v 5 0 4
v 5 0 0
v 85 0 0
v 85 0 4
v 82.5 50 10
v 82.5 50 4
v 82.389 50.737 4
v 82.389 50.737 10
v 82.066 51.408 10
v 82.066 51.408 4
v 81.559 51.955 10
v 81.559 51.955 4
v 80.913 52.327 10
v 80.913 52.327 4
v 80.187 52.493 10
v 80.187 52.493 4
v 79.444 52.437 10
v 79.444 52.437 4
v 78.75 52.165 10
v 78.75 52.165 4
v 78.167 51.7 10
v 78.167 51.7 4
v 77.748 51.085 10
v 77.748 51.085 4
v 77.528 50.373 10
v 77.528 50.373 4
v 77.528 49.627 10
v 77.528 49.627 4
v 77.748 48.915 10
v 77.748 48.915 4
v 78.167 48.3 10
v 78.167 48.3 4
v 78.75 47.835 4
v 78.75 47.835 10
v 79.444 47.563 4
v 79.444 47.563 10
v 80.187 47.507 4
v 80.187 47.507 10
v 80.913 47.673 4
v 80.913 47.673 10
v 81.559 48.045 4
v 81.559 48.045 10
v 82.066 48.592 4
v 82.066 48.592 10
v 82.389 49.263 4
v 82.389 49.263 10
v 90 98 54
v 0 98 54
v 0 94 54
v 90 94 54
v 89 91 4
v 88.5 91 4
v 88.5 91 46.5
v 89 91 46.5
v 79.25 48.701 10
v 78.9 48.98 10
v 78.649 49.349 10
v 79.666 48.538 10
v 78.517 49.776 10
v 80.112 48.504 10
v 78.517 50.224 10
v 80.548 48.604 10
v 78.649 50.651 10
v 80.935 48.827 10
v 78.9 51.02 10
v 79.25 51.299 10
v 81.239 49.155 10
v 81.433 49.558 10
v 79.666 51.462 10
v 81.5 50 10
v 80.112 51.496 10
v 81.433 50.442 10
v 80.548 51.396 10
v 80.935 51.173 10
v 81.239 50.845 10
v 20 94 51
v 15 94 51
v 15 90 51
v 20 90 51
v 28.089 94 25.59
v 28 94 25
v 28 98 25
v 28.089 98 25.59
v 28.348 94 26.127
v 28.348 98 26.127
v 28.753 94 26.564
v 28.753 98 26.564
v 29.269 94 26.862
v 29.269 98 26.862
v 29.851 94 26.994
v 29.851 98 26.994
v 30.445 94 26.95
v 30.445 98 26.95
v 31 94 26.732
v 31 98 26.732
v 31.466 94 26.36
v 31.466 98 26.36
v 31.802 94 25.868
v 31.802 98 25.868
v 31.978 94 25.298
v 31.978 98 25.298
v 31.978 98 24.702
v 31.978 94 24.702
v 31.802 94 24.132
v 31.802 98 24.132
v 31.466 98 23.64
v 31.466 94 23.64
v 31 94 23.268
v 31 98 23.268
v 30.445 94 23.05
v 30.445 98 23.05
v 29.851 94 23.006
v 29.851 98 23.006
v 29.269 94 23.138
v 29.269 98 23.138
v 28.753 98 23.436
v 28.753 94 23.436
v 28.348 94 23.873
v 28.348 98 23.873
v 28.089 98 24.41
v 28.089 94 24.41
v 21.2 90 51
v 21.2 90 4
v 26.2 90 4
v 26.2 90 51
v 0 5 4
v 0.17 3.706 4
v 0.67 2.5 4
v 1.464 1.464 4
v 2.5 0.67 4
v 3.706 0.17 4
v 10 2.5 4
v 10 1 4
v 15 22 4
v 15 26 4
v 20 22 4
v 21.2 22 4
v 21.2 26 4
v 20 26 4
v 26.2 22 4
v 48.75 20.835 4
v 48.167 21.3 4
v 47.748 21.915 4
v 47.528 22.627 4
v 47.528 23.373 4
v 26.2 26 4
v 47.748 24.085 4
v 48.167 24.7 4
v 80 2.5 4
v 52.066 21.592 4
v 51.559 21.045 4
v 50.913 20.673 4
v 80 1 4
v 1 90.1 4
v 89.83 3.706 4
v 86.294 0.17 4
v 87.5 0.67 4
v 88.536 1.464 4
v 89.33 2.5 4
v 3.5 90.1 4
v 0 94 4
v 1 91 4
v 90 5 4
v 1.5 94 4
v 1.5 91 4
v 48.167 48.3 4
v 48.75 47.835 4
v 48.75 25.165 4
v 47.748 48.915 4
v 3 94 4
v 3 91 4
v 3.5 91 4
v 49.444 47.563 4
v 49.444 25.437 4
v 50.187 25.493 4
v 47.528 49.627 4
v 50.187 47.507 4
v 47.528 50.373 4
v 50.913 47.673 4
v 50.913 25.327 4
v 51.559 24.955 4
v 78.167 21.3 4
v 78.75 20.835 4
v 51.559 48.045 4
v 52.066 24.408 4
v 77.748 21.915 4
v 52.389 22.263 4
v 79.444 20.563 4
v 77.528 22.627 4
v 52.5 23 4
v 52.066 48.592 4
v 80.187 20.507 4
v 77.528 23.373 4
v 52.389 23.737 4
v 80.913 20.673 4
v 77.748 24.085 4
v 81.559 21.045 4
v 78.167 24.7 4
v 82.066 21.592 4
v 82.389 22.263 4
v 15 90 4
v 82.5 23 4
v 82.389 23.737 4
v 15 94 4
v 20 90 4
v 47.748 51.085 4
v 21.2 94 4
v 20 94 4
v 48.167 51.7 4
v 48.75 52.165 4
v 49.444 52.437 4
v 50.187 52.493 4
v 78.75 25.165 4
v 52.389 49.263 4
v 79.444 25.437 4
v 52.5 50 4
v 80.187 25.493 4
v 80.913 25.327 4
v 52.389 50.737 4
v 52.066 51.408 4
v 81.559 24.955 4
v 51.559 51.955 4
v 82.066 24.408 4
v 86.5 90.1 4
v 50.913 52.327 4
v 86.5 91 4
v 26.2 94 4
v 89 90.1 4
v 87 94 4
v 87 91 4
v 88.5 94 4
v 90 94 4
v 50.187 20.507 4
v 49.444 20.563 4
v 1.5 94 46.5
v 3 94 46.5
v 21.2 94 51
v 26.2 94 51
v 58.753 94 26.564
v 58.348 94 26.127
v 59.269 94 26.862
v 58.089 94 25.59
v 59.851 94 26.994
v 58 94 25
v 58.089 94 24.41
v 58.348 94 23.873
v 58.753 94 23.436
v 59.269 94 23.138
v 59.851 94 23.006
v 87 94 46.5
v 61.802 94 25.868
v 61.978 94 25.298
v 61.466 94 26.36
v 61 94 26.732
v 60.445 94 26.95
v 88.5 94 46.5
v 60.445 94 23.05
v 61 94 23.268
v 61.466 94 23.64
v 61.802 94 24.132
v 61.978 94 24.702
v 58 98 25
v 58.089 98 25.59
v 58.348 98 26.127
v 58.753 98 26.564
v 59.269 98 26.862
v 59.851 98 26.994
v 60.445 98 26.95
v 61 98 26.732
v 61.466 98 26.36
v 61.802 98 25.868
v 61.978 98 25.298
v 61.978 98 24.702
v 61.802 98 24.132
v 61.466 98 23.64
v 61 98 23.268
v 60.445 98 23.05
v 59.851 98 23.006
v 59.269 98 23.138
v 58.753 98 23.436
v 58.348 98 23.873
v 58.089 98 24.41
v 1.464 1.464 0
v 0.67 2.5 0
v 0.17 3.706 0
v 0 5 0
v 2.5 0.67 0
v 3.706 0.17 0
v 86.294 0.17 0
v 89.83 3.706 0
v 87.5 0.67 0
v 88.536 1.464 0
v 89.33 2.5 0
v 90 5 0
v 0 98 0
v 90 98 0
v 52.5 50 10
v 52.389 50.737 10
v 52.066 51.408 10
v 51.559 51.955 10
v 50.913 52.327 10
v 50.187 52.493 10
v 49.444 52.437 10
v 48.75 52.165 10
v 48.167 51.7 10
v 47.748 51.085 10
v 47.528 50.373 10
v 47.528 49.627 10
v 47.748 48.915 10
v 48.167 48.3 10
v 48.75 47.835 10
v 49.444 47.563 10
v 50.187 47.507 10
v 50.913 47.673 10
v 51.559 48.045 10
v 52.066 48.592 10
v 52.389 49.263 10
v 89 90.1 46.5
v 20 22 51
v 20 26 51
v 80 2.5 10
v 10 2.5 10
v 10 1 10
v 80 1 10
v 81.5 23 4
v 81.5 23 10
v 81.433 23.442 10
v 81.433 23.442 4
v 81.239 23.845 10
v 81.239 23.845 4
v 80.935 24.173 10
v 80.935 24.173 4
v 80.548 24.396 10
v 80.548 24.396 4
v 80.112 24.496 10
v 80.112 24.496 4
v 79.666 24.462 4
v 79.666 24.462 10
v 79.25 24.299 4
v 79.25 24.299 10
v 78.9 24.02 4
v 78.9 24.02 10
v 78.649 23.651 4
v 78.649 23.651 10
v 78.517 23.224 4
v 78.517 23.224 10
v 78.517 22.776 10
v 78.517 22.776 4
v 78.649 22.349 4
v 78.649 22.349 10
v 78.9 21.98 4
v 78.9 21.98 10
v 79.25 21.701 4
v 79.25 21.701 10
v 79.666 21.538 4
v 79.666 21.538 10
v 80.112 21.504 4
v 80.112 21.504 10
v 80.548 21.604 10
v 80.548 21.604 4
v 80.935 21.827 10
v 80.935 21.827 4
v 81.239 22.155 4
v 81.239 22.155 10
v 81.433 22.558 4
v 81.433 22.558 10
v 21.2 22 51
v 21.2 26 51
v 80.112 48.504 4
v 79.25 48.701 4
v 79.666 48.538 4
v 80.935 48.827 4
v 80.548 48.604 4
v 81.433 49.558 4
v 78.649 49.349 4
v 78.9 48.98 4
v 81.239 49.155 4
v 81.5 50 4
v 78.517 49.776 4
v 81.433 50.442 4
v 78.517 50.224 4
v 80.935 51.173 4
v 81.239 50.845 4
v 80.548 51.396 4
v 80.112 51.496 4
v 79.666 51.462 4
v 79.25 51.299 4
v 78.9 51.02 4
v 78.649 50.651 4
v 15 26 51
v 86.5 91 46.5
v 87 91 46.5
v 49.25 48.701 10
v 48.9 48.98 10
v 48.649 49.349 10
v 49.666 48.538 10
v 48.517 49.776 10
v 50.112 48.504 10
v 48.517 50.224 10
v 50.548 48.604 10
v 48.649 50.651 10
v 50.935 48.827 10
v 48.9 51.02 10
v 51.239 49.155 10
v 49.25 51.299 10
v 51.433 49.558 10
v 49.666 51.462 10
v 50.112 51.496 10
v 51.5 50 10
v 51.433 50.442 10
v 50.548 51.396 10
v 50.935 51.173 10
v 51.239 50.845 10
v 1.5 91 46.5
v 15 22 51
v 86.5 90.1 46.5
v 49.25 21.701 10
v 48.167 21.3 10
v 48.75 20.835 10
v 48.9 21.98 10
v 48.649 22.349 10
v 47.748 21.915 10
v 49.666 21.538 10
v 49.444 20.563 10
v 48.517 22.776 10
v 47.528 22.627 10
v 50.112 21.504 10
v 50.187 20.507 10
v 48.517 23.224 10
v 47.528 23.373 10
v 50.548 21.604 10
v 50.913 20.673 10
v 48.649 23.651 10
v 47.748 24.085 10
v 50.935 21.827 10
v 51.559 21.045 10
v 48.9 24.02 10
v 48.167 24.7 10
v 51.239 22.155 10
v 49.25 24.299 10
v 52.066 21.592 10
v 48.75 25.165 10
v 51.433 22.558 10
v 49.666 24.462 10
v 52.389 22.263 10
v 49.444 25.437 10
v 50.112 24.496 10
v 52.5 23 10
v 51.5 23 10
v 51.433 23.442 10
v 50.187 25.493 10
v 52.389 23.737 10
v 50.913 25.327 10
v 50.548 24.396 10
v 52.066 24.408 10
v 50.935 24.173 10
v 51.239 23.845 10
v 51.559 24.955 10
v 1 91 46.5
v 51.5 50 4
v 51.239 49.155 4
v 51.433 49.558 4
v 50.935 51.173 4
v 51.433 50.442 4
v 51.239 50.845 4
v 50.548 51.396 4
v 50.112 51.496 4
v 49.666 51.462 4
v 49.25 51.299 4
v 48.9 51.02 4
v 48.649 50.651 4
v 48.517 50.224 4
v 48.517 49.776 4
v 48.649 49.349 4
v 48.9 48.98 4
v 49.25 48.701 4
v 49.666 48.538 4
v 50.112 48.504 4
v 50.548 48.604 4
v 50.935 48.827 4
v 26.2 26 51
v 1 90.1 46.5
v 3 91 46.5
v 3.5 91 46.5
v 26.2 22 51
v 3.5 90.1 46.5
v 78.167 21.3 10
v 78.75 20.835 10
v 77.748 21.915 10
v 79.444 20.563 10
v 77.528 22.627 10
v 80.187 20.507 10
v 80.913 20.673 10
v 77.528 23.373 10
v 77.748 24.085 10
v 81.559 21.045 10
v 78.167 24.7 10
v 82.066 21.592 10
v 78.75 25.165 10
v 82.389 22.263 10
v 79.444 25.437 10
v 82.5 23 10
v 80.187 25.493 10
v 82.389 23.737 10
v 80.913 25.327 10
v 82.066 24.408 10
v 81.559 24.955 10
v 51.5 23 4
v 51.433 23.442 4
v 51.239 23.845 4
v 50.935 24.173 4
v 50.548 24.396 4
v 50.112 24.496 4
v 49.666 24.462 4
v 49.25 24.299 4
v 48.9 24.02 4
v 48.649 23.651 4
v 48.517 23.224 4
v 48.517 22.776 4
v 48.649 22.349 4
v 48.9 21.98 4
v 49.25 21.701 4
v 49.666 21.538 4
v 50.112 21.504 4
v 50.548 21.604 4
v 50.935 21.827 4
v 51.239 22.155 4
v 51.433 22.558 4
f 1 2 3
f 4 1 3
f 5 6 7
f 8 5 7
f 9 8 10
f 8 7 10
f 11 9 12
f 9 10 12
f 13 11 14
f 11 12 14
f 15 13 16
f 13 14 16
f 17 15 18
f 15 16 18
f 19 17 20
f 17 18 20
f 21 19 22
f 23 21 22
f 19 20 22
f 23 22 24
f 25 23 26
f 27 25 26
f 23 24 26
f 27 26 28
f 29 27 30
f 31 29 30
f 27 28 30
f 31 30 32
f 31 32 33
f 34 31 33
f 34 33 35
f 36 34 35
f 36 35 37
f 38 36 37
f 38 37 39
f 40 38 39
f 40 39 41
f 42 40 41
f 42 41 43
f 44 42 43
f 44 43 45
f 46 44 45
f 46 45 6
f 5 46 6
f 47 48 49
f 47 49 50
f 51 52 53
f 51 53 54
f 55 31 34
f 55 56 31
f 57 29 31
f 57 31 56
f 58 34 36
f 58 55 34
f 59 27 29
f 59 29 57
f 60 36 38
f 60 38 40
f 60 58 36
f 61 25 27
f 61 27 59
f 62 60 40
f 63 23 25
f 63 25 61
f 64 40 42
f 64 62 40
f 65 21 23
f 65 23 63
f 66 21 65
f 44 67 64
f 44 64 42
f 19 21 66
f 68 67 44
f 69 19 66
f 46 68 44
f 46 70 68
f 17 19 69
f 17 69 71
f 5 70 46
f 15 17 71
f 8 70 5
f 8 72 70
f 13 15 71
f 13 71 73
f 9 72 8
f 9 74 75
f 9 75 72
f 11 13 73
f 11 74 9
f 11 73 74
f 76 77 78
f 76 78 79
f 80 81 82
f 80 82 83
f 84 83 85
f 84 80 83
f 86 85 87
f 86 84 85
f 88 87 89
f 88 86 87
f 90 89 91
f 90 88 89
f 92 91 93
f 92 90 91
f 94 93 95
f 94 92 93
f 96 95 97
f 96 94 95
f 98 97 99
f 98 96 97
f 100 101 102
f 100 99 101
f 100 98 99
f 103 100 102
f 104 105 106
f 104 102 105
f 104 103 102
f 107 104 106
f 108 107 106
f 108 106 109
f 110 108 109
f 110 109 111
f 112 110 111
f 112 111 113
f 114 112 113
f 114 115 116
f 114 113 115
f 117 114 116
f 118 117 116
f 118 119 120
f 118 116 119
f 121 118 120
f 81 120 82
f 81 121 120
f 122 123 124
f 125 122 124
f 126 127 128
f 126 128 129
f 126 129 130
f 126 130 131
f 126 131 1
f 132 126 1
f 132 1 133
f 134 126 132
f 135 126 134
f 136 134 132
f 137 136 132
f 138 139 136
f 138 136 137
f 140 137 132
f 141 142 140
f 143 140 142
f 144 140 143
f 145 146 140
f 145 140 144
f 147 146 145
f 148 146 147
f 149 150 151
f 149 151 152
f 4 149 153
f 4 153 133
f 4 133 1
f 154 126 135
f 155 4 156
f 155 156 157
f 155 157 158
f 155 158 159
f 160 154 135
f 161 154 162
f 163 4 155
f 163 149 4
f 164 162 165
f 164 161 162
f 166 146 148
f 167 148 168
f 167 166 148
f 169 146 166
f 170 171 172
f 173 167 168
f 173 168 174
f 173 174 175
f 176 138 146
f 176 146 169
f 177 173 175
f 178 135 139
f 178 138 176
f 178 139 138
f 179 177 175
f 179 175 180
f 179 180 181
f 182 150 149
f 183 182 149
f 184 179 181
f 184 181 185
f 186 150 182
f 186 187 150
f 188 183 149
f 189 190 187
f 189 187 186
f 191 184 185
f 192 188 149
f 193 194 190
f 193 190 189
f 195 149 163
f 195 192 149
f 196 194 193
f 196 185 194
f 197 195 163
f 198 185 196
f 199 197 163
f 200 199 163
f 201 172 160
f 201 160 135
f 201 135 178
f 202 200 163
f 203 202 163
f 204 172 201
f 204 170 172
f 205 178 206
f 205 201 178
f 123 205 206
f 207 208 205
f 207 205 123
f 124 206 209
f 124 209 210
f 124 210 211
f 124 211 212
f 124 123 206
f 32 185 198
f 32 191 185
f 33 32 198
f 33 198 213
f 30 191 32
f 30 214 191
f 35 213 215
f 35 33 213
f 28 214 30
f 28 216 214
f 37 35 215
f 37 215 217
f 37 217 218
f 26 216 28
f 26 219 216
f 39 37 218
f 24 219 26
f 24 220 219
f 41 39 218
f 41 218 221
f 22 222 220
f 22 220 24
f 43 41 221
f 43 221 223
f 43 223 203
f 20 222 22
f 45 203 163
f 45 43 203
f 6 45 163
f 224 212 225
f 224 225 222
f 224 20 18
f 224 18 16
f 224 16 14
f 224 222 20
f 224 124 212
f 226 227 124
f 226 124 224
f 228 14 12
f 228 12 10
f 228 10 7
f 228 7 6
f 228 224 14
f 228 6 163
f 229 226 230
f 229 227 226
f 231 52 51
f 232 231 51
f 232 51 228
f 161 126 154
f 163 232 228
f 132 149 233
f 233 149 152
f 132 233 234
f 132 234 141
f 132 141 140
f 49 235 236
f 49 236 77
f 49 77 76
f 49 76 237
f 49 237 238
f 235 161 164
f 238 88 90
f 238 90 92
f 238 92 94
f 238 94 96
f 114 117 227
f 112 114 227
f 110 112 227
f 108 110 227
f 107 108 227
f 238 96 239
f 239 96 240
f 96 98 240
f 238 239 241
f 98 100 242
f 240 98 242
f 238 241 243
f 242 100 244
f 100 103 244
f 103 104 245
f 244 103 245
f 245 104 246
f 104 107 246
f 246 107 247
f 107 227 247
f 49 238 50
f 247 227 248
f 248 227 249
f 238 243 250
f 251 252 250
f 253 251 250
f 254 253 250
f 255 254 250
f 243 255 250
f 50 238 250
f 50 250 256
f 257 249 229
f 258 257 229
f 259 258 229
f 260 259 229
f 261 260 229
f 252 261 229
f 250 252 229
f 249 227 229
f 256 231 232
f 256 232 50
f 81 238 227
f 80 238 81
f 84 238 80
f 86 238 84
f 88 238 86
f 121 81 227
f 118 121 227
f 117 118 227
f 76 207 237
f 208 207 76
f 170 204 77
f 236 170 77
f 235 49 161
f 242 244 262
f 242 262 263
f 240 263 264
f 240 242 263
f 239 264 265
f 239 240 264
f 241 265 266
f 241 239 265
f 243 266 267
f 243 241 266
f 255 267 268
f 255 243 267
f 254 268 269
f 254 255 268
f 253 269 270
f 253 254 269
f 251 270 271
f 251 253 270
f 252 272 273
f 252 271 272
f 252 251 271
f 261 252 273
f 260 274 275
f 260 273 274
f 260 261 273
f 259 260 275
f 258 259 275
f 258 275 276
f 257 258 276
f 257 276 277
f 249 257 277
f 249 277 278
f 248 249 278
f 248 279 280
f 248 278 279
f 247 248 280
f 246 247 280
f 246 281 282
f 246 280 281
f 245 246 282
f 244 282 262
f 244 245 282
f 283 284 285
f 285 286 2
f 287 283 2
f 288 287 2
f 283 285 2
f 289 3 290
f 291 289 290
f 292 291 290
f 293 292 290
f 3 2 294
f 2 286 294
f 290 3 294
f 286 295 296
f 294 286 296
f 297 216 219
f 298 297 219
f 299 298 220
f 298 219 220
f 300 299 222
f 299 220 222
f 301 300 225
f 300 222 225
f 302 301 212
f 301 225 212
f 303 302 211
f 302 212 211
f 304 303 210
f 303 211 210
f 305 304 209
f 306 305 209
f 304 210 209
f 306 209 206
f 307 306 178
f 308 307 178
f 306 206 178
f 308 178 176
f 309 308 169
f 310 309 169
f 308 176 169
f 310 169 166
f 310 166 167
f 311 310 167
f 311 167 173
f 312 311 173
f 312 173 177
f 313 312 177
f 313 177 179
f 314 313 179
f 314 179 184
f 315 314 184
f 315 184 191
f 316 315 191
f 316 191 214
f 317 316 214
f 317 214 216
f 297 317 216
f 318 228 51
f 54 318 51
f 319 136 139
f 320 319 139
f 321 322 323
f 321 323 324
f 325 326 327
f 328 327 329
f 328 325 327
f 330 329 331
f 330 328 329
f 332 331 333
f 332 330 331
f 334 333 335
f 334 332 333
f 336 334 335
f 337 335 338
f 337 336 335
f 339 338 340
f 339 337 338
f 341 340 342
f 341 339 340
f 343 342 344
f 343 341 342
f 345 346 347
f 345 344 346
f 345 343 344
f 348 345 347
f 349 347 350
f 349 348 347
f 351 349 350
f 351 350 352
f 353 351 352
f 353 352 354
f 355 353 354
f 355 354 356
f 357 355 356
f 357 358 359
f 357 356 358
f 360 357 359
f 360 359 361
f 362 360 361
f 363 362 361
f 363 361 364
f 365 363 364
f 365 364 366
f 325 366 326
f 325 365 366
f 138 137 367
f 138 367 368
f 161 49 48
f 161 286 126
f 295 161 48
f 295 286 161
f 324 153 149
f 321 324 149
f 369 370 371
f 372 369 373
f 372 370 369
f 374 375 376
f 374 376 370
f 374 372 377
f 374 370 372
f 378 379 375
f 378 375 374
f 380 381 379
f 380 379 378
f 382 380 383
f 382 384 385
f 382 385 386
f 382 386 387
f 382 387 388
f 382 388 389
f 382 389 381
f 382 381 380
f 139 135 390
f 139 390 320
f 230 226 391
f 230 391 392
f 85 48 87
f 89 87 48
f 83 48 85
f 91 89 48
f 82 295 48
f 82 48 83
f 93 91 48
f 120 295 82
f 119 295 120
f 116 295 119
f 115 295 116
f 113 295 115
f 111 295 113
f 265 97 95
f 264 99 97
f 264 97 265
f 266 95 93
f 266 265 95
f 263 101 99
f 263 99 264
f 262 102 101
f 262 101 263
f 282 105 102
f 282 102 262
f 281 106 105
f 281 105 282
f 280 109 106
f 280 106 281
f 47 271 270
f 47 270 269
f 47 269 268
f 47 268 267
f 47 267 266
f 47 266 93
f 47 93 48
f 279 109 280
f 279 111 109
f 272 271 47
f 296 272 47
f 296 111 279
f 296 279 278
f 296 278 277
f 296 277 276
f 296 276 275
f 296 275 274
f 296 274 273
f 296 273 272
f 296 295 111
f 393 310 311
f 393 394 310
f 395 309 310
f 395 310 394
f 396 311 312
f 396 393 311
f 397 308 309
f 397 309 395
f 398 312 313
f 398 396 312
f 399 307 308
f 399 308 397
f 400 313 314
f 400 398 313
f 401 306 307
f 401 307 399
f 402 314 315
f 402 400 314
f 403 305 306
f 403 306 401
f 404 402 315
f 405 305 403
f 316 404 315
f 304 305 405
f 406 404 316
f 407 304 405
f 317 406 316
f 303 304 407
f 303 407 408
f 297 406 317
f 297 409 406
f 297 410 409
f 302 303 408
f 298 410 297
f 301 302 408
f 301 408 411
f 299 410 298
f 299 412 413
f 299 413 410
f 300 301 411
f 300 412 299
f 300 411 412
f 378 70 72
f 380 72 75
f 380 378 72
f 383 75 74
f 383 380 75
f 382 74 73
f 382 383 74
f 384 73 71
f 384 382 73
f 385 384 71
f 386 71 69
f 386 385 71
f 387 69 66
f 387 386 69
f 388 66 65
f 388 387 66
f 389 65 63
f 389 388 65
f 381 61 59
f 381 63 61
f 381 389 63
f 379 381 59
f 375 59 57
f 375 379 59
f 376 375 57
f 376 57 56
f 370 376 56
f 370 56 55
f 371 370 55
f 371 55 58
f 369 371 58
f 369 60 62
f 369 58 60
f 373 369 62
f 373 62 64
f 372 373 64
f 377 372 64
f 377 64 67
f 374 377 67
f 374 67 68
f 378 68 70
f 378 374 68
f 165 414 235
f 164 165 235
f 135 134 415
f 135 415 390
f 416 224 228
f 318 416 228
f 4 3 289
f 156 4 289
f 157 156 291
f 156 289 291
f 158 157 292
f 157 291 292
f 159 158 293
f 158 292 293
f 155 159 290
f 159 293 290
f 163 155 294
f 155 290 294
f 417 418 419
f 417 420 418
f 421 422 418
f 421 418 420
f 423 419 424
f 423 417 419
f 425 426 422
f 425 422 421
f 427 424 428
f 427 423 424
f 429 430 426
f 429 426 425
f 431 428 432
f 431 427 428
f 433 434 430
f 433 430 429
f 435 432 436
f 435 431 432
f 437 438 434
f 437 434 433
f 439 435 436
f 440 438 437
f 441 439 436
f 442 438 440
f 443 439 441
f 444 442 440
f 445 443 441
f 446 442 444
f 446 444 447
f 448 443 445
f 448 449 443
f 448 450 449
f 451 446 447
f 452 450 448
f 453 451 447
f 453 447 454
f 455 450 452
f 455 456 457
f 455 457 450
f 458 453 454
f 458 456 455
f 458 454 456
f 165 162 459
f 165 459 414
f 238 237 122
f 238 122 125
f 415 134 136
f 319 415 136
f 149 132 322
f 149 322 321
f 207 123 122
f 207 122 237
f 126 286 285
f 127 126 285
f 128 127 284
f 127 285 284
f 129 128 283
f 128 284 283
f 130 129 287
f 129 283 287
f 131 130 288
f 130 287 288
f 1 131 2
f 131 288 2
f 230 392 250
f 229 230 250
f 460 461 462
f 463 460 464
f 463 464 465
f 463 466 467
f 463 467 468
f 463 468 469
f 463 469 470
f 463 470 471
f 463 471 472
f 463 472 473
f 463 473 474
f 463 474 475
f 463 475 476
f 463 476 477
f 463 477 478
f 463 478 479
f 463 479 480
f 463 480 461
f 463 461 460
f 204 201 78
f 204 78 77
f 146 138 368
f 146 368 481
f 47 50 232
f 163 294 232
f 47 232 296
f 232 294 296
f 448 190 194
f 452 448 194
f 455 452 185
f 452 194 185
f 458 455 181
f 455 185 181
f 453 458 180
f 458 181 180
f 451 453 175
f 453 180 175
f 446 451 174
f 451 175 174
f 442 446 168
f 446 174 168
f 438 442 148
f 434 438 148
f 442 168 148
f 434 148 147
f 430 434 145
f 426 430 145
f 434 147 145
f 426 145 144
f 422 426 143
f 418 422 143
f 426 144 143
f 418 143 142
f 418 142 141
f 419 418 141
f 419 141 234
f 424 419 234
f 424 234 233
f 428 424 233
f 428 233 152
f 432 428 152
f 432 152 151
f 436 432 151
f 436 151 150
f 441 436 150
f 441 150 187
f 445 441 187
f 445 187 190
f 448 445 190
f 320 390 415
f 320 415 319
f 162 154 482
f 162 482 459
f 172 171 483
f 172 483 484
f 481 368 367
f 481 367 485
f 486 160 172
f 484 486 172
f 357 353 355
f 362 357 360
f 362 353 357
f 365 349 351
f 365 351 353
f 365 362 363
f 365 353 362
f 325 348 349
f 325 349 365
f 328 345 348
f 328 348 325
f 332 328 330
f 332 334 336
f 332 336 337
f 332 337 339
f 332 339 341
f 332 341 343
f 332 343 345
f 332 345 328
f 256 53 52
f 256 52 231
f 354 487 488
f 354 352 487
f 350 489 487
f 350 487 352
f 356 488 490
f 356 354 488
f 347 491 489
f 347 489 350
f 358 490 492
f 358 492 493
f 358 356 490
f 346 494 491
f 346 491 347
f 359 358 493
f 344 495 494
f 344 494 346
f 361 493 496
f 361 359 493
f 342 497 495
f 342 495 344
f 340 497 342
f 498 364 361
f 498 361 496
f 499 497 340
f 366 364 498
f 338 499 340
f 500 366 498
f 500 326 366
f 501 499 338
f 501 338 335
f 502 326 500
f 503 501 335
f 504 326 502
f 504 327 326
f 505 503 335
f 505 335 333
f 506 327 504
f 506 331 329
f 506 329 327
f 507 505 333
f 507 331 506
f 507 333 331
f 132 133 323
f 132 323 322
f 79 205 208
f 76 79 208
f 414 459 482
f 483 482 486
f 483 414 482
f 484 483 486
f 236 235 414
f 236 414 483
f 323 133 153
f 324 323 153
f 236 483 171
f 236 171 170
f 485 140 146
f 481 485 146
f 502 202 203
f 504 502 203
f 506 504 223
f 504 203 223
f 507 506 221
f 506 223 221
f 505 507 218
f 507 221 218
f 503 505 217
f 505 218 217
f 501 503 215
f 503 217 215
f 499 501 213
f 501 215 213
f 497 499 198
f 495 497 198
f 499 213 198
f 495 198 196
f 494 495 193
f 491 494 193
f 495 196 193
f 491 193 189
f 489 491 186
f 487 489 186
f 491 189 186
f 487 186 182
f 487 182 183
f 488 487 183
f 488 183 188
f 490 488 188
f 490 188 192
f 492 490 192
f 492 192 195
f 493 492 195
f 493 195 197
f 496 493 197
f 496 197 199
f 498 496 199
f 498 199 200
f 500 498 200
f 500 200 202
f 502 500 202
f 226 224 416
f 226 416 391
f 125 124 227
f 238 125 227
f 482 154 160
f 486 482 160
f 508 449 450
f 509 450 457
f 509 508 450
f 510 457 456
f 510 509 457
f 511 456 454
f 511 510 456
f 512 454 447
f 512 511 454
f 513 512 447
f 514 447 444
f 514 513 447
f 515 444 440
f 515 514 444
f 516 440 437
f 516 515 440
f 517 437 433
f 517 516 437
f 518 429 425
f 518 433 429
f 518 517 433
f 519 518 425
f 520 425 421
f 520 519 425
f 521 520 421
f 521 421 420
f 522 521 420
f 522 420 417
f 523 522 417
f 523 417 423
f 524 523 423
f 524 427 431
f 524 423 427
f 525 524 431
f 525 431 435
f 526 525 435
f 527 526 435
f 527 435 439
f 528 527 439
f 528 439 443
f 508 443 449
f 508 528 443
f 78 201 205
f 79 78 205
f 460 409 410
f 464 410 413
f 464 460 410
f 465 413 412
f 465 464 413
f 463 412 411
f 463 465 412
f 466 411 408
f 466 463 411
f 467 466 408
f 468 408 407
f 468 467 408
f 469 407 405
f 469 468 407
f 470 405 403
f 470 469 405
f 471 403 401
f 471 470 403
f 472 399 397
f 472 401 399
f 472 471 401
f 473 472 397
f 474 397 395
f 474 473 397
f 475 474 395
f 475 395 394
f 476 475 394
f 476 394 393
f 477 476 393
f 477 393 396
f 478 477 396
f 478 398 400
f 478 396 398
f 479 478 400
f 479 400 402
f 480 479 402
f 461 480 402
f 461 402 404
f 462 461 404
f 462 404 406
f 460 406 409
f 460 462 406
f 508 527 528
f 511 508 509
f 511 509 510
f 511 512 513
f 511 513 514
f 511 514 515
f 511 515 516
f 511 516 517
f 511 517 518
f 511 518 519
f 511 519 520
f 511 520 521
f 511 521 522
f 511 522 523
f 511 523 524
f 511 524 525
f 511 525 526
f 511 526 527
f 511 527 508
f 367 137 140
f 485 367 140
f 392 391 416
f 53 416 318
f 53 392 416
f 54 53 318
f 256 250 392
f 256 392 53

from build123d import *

# Parameters (mm, degrees)
PAD_DEPTH         = 4
SKETCH003_W       = 90
SKETCH003_H       = 4
PAD001_DEPTH      = 54
SKETCH002_W       = 5
SKETCH002_H       = 4
PAD002_DEPTH      = 51
SKETCH006_R       = 2
POCKET_DEPTH      = 84.001
POCKET_DEPTH_BACK = 14.001
SKETCH005_W       = 70
SKETCH005_H       = 1.5
PAD003_DEPTH      = 10
SKETCH004_W       = 1.5
SKETCH004_H       = 3
SKETCH004_W_2     = 2.5
SKETCH004_H_2     = 0.9
PAD004_DEPTH      = 46.5
SKETCH_R          = 2.5
PAD005_DEPTH      = 10
POCKET001_START   = 4
SKETCH007_R       = 1.5
POCKET001_DEPTH   = 20


with BuildPart() as part:
    # Sketch001 → Pad (new body)
    with BuildSketch(Plane.XY):
        with BuildLine():
            Line((0, 94), (0, 5))
            ThreePointArc((0, 5), (1.464466, 1.464466), (5, 0))
            Line((5, 0), (85, 0))
            ThreePointArc((85, 0), (88.535534, 1.464466), (90, 5))
            Line((90, 5), (90, 94))
            Line((90, 94), (0, 94))
        make_face()
    extrude(amount=PAD_DEPTH)

    # Sketch003 → Pad001 (join)
    with BuildSketch(Plane.XY):
        with Locations((45, 96)):
            Rectangle(SKETCH003_W, SKETCH003_H)
    extrude(amount=PAD001_DEPTH)

    # Sketch002 → Pad002 (join)
    with BuildSketch(Plane.XY):
        with Locations((17.5, 92)):
            Rectangle(SKETCH002_W, SKETCH002_H)
        with Locations((17.5, 24)):
            Rectangle(SKETCH002_W, SKETCH002_H)
        with Locations((23.7, 92)):
            Rectangle(SKETCH002_W, SKETCH002_H)
        with Locations((23.7, 24)):
            Rectangle(SKETCH002_W, SKETCH002_H)
    extrude(amount=PAD002_DEPTH)

    # Sketch006 → Pocket (cut, two sides)
    with BuildSketch(Plane(origin=(0, 84, 0), x_dir=(-1, 0, 0), z_dir=(0, 1, 0))) as pocket_sk:
        with Locations((-30, 25)):
            Circle(SKETCH006_R)
        with Locations((-60, 25)):
            Circle(SKETCH006_R)
    extrude(amount=-POCKET_DEPTH, mode=Mode.SUBTRACT)
    extrude(pocket_sk.sketch, amount=POCKET_DEPTH_BACK, mode=Mode.SUBTRACT)

    # Sketch005 → Pad003 (join)
    with BuildSketch(Plane.XY):
        with Locations((45, 1.75)):
            Rectangle(SKETCH005_W, SKETCH005_H)
    extrude(amount=PAD003_DEPTH)

    # Sketch004 → Pad004 (join)
    with BuildSketch(Plane.XY):
        with Locations((2.25, 92.5)):
            Rectangle(SKETCH004_W, SKETCH004_H)
        with Locations((2.25, 90.55)):
            Rectangle(SKETCH004_W_2, SKETCH004_H_2)
        with Locations((87.75, 92.5)):
            Rectangle(SKETCH004_W, SKETCH004_H)
        with Locations((87.75, 90.55)):
            Rectangle(SKETCH004_W_2, SKETCH004_H_2)
    extrude(amount=PAD004_DEPTH)

    # Sketch → Pad005 (join)
    with BuildSketch(Plane.XY):
        with Locations((80, 50)):
            Circle(SKETCH_R)
        with Locations((80, 23)):
            Circle(SKETCH_R)
        with Locations((50, 50)):
            Circle(SKETCH_R)
        with Locations((50, 23)):
            Circle(SKETCH_R)
    extrude(amount=PAD005_DEPTH)

    # Sketch007 → Pocket001 (cut)
    with BuildSketch(Plane.XY.offset(POCKET001_START)):
        with Locations((80, 50)):
            Circle(SKETCH007_R)
        with Locations((80, 23)):
            Circle(SKETCH007_R)
        with Locations((50, 50)):
            Circle(SKETCH007_R)
        with Locations((50, 23)):
            Circle(SKETCH007_R)
    extrude(amount=POCKET001_DEPTH, mode=Mode.SUBTRACT)


solid = part.part
